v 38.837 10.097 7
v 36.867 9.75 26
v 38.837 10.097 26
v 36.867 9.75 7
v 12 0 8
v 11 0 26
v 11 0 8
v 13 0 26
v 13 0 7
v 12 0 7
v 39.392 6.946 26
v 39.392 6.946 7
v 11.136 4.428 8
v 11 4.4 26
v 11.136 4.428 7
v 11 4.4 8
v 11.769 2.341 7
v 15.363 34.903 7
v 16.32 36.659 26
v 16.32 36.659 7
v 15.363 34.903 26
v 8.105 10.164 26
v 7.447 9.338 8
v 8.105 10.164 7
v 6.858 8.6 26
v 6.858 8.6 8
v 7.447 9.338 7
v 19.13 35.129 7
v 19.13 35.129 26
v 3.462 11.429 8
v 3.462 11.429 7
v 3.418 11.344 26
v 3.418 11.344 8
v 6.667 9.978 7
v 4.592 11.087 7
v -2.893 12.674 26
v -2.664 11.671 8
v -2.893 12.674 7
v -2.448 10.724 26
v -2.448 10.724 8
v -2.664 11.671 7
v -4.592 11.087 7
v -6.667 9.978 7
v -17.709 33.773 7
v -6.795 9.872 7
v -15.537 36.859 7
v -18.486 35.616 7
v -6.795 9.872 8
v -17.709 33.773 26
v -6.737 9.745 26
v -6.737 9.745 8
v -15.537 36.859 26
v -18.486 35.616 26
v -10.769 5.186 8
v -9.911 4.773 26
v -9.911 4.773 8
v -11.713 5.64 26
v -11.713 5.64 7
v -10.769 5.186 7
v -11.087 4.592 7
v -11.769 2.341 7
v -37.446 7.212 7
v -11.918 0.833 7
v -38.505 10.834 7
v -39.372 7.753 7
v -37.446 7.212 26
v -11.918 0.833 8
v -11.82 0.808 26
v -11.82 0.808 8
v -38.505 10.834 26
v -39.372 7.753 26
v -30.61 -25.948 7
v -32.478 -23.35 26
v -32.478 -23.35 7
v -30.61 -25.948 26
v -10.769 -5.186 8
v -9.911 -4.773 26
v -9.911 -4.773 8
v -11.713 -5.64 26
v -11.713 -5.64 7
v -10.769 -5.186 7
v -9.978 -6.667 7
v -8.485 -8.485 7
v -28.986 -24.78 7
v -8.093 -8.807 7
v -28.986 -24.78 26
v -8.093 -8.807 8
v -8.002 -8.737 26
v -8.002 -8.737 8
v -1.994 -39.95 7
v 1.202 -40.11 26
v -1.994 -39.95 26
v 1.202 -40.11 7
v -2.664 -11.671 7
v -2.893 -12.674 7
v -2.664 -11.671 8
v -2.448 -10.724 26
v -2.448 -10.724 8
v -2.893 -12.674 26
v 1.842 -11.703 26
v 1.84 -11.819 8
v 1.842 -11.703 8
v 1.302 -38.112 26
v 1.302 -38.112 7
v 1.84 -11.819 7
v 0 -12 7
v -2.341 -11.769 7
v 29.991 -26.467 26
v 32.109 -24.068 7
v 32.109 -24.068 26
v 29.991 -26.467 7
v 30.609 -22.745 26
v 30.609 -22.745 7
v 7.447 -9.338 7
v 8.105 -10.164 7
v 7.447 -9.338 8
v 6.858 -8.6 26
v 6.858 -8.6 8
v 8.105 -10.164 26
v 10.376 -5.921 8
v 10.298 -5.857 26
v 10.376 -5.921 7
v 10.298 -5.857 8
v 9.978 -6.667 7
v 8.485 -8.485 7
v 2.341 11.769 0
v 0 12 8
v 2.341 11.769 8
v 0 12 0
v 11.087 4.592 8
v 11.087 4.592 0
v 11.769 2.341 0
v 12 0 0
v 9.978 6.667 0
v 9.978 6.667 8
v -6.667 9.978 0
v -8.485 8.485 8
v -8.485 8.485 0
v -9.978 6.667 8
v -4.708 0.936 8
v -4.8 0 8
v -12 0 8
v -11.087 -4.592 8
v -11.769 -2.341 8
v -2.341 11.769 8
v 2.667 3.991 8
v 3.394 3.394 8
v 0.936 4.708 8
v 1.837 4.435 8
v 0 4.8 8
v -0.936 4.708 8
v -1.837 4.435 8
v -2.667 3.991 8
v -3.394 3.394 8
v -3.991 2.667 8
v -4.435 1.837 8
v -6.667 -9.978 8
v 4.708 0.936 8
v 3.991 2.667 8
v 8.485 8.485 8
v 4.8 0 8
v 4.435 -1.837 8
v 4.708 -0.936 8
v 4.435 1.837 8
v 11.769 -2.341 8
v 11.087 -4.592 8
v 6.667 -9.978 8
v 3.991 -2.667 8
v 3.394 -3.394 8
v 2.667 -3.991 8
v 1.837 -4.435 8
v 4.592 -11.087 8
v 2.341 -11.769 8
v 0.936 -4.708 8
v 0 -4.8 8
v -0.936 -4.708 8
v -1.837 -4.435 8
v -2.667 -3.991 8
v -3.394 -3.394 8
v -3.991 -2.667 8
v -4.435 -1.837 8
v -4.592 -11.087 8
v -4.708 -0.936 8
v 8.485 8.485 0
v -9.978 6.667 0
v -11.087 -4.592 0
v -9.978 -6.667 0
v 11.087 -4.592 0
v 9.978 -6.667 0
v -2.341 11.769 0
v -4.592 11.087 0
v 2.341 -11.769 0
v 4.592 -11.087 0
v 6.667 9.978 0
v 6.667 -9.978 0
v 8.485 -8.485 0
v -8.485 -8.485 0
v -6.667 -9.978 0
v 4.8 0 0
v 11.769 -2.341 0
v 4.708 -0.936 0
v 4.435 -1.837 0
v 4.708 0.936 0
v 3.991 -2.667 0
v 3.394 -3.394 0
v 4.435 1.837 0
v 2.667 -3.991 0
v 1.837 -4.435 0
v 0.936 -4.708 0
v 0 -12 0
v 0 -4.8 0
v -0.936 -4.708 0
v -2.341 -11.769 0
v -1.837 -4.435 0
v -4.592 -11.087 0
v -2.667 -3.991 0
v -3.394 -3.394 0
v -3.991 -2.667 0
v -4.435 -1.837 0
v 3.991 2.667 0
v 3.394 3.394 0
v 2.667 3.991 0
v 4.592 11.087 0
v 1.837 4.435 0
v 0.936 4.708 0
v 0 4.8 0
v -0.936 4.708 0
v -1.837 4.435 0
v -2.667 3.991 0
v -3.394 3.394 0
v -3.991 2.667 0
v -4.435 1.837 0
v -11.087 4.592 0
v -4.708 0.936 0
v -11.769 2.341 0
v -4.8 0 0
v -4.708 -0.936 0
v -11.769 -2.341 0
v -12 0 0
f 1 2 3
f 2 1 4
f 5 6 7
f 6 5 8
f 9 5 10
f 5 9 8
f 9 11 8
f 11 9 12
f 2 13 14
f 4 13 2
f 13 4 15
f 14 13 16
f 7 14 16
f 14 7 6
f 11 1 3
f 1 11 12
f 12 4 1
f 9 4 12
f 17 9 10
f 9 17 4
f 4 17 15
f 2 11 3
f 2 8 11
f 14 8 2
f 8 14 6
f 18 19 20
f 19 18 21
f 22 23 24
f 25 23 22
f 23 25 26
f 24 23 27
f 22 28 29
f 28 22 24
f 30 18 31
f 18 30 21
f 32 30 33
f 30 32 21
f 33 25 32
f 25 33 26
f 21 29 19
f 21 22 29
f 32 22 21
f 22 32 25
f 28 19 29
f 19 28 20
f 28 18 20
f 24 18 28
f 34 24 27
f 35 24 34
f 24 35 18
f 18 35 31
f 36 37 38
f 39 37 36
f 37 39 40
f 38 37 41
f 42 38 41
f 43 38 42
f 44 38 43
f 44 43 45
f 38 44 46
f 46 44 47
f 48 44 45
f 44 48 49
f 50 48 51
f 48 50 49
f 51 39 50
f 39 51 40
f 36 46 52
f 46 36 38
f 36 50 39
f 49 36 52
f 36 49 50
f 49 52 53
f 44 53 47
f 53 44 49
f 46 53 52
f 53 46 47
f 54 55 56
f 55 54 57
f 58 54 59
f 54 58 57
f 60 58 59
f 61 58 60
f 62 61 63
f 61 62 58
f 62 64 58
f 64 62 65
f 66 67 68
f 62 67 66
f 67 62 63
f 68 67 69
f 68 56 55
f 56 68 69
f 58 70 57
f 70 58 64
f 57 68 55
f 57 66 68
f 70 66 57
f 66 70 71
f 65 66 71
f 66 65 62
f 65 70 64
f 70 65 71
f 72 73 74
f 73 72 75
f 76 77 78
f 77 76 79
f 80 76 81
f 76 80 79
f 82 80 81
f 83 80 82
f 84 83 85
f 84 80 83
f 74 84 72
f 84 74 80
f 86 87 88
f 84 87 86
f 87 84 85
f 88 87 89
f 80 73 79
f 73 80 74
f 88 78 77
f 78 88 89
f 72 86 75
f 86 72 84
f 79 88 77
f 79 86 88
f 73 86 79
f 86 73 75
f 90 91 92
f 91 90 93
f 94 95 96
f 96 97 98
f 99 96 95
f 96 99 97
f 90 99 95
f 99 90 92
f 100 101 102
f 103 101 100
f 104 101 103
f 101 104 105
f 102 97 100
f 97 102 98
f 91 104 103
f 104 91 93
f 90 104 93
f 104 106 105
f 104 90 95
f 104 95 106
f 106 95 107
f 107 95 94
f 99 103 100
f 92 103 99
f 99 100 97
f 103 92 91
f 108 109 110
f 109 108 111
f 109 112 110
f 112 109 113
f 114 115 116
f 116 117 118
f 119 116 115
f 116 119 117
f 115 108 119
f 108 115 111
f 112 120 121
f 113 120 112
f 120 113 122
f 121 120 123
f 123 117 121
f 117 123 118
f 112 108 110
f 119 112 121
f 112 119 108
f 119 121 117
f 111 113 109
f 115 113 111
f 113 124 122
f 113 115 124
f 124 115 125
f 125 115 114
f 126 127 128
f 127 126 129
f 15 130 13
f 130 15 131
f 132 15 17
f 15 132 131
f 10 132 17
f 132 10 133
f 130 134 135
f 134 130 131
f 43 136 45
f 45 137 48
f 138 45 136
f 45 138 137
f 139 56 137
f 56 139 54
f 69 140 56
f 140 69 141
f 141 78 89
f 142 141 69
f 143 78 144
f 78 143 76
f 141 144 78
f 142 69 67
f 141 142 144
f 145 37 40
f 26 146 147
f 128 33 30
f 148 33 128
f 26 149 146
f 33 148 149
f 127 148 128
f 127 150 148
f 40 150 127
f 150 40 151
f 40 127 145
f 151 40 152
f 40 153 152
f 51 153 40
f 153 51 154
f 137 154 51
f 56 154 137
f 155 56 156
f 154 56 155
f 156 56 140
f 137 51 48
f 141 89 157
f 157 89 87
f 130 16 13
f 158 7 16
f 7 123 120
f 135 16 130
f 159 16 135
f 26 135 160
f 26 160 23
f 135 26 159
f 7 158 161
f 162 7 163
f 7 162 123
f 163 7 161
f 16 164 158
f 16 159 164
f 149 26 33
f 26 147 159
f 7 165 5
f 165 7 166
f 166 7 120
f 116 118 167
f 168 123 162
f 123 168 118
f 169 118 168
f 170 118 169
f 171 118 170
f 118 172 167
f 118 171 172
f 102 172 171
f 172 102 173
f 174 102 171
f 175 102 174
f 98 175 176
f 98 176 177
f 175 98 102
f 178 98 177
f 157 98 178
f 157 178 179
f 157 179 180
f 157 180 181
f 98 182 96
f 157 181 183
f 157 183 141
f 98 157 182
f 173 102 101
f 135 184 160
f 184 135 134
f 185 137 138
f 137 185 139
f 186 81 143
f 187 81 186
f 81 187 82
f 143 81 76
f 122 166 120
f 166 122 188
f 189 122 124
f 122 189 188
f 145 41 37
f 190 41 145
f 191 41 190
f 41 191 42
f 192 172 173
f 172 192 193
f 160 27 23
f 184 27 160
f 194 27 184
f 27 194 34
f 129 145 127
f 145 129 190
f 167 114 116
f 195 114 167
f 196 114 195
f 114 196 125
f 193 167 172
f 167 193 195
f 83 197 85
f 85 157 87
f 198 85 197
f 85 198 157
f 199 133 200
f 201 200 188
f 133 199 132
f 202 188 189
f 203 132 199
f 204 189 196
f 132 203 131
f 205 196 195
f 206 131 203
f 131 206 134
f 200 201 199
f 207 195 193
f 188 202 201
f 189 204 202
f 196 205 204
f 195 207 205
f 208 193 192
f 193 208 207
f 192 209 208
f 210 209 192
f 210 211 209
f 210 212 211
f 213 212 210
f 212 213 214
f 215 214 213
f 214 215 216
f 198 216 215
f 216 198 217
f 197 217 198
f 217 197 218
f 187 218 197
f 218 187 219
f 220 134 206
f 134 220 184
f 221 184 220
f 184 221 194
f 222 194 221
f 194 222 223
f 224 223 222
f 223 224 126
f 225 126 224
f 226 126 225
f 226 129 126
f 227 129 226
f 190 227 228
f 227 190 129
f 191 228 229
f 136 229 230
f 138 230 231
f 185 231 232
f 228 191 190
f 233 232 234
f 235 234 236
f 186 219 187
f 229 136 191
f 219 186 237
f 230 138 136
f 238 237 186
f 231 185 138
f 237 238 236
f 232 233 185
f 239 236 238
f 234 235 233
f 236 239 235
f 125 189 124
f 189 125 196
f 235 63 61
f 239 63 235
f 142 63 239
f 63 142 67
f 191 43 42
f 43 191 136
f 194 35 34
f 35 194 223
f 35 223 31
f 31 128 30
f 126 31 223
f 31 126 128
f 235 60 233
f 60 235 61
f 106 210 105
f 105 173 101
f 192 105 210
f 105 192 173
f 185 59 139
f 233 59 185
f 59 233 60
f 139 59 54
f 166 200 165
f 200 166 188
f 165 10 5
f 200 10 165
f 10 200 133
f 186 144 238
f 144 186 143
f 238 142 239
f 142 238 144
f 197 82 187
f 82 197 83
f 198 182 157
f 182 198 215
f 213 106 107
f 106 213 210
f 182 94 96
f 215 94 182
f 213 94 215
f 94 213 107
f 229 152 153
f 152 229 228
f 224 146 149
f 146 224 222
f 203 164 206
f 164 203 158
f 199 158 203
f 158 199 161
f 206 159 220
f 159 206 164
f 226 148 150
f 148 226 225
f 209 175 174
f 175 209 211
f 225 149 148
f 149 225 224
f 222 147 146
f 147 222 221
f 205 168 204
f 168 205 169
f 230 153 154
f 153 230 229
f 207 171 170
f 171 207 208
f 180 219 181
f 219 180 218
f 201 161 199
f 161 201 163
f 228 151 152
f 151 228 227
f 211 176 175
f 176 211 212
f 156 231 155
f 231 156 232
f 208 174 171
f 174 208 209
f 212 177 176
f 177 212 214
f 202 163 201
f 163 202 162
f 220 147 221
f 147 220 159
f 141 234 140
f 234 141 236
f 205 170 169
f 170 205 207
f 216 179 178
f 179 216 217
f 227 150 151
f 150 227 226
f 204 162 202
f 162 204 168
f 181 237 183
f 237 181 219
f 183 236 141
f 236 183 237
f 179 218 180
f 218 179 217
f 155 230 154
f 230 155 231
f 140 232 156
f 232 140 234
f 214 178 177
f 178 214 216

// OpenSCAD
$fn = 32;

// ----------------------------------------------------------------------
// Impeller: 80 mm, 7 blades, 26 mm tall
// ----------------------------------------------------------------------

// --- parameters (mm) ---
boss_d = 24;              // hub diameter
boss_h = 8;               // hub height
rotor_d = 80;             // outer diameter over the blades
vane_count = 7;           // number of blades
blade_t = 2;              // blade thickness
blade_h = 18;             // blade height
blade_in_r = 11;          // blade root radius
blade_out_r = 38;         // blade tip radius
sweep = 10;               // blade sweep, degrees
bore_d = 9.6;             // shaft bore

module hub() {
  cylinder(h = boss_h, d = boss_d);
}

module blade() {
  /* blade swept between two boxes: hull of the root and the tip section */
  hull() {
    translate([blade_in_r, 0, boss_h - 1])
      cube([blade_t, blade_t * 2.2, blade_h + 1], center = false);
    rotate([0, 0, sweep])
      translate([blade_out_r, 0, boss_h - 1])
        cube([blade_t, blade_t * 1.6, blade_h + 1], center = false);
  }
}

module blades() {
  for (i = [0 : vane_count - 1])
    rotate([0, 0, i * 360 / vane_count]) blade();
}

difference() {
  union() {
    hub();
    blades();
  }
  translate([0, 0, -1]) cylinder(h = boss_h + blade_h + 0 + 3, d = bore_d);
}
